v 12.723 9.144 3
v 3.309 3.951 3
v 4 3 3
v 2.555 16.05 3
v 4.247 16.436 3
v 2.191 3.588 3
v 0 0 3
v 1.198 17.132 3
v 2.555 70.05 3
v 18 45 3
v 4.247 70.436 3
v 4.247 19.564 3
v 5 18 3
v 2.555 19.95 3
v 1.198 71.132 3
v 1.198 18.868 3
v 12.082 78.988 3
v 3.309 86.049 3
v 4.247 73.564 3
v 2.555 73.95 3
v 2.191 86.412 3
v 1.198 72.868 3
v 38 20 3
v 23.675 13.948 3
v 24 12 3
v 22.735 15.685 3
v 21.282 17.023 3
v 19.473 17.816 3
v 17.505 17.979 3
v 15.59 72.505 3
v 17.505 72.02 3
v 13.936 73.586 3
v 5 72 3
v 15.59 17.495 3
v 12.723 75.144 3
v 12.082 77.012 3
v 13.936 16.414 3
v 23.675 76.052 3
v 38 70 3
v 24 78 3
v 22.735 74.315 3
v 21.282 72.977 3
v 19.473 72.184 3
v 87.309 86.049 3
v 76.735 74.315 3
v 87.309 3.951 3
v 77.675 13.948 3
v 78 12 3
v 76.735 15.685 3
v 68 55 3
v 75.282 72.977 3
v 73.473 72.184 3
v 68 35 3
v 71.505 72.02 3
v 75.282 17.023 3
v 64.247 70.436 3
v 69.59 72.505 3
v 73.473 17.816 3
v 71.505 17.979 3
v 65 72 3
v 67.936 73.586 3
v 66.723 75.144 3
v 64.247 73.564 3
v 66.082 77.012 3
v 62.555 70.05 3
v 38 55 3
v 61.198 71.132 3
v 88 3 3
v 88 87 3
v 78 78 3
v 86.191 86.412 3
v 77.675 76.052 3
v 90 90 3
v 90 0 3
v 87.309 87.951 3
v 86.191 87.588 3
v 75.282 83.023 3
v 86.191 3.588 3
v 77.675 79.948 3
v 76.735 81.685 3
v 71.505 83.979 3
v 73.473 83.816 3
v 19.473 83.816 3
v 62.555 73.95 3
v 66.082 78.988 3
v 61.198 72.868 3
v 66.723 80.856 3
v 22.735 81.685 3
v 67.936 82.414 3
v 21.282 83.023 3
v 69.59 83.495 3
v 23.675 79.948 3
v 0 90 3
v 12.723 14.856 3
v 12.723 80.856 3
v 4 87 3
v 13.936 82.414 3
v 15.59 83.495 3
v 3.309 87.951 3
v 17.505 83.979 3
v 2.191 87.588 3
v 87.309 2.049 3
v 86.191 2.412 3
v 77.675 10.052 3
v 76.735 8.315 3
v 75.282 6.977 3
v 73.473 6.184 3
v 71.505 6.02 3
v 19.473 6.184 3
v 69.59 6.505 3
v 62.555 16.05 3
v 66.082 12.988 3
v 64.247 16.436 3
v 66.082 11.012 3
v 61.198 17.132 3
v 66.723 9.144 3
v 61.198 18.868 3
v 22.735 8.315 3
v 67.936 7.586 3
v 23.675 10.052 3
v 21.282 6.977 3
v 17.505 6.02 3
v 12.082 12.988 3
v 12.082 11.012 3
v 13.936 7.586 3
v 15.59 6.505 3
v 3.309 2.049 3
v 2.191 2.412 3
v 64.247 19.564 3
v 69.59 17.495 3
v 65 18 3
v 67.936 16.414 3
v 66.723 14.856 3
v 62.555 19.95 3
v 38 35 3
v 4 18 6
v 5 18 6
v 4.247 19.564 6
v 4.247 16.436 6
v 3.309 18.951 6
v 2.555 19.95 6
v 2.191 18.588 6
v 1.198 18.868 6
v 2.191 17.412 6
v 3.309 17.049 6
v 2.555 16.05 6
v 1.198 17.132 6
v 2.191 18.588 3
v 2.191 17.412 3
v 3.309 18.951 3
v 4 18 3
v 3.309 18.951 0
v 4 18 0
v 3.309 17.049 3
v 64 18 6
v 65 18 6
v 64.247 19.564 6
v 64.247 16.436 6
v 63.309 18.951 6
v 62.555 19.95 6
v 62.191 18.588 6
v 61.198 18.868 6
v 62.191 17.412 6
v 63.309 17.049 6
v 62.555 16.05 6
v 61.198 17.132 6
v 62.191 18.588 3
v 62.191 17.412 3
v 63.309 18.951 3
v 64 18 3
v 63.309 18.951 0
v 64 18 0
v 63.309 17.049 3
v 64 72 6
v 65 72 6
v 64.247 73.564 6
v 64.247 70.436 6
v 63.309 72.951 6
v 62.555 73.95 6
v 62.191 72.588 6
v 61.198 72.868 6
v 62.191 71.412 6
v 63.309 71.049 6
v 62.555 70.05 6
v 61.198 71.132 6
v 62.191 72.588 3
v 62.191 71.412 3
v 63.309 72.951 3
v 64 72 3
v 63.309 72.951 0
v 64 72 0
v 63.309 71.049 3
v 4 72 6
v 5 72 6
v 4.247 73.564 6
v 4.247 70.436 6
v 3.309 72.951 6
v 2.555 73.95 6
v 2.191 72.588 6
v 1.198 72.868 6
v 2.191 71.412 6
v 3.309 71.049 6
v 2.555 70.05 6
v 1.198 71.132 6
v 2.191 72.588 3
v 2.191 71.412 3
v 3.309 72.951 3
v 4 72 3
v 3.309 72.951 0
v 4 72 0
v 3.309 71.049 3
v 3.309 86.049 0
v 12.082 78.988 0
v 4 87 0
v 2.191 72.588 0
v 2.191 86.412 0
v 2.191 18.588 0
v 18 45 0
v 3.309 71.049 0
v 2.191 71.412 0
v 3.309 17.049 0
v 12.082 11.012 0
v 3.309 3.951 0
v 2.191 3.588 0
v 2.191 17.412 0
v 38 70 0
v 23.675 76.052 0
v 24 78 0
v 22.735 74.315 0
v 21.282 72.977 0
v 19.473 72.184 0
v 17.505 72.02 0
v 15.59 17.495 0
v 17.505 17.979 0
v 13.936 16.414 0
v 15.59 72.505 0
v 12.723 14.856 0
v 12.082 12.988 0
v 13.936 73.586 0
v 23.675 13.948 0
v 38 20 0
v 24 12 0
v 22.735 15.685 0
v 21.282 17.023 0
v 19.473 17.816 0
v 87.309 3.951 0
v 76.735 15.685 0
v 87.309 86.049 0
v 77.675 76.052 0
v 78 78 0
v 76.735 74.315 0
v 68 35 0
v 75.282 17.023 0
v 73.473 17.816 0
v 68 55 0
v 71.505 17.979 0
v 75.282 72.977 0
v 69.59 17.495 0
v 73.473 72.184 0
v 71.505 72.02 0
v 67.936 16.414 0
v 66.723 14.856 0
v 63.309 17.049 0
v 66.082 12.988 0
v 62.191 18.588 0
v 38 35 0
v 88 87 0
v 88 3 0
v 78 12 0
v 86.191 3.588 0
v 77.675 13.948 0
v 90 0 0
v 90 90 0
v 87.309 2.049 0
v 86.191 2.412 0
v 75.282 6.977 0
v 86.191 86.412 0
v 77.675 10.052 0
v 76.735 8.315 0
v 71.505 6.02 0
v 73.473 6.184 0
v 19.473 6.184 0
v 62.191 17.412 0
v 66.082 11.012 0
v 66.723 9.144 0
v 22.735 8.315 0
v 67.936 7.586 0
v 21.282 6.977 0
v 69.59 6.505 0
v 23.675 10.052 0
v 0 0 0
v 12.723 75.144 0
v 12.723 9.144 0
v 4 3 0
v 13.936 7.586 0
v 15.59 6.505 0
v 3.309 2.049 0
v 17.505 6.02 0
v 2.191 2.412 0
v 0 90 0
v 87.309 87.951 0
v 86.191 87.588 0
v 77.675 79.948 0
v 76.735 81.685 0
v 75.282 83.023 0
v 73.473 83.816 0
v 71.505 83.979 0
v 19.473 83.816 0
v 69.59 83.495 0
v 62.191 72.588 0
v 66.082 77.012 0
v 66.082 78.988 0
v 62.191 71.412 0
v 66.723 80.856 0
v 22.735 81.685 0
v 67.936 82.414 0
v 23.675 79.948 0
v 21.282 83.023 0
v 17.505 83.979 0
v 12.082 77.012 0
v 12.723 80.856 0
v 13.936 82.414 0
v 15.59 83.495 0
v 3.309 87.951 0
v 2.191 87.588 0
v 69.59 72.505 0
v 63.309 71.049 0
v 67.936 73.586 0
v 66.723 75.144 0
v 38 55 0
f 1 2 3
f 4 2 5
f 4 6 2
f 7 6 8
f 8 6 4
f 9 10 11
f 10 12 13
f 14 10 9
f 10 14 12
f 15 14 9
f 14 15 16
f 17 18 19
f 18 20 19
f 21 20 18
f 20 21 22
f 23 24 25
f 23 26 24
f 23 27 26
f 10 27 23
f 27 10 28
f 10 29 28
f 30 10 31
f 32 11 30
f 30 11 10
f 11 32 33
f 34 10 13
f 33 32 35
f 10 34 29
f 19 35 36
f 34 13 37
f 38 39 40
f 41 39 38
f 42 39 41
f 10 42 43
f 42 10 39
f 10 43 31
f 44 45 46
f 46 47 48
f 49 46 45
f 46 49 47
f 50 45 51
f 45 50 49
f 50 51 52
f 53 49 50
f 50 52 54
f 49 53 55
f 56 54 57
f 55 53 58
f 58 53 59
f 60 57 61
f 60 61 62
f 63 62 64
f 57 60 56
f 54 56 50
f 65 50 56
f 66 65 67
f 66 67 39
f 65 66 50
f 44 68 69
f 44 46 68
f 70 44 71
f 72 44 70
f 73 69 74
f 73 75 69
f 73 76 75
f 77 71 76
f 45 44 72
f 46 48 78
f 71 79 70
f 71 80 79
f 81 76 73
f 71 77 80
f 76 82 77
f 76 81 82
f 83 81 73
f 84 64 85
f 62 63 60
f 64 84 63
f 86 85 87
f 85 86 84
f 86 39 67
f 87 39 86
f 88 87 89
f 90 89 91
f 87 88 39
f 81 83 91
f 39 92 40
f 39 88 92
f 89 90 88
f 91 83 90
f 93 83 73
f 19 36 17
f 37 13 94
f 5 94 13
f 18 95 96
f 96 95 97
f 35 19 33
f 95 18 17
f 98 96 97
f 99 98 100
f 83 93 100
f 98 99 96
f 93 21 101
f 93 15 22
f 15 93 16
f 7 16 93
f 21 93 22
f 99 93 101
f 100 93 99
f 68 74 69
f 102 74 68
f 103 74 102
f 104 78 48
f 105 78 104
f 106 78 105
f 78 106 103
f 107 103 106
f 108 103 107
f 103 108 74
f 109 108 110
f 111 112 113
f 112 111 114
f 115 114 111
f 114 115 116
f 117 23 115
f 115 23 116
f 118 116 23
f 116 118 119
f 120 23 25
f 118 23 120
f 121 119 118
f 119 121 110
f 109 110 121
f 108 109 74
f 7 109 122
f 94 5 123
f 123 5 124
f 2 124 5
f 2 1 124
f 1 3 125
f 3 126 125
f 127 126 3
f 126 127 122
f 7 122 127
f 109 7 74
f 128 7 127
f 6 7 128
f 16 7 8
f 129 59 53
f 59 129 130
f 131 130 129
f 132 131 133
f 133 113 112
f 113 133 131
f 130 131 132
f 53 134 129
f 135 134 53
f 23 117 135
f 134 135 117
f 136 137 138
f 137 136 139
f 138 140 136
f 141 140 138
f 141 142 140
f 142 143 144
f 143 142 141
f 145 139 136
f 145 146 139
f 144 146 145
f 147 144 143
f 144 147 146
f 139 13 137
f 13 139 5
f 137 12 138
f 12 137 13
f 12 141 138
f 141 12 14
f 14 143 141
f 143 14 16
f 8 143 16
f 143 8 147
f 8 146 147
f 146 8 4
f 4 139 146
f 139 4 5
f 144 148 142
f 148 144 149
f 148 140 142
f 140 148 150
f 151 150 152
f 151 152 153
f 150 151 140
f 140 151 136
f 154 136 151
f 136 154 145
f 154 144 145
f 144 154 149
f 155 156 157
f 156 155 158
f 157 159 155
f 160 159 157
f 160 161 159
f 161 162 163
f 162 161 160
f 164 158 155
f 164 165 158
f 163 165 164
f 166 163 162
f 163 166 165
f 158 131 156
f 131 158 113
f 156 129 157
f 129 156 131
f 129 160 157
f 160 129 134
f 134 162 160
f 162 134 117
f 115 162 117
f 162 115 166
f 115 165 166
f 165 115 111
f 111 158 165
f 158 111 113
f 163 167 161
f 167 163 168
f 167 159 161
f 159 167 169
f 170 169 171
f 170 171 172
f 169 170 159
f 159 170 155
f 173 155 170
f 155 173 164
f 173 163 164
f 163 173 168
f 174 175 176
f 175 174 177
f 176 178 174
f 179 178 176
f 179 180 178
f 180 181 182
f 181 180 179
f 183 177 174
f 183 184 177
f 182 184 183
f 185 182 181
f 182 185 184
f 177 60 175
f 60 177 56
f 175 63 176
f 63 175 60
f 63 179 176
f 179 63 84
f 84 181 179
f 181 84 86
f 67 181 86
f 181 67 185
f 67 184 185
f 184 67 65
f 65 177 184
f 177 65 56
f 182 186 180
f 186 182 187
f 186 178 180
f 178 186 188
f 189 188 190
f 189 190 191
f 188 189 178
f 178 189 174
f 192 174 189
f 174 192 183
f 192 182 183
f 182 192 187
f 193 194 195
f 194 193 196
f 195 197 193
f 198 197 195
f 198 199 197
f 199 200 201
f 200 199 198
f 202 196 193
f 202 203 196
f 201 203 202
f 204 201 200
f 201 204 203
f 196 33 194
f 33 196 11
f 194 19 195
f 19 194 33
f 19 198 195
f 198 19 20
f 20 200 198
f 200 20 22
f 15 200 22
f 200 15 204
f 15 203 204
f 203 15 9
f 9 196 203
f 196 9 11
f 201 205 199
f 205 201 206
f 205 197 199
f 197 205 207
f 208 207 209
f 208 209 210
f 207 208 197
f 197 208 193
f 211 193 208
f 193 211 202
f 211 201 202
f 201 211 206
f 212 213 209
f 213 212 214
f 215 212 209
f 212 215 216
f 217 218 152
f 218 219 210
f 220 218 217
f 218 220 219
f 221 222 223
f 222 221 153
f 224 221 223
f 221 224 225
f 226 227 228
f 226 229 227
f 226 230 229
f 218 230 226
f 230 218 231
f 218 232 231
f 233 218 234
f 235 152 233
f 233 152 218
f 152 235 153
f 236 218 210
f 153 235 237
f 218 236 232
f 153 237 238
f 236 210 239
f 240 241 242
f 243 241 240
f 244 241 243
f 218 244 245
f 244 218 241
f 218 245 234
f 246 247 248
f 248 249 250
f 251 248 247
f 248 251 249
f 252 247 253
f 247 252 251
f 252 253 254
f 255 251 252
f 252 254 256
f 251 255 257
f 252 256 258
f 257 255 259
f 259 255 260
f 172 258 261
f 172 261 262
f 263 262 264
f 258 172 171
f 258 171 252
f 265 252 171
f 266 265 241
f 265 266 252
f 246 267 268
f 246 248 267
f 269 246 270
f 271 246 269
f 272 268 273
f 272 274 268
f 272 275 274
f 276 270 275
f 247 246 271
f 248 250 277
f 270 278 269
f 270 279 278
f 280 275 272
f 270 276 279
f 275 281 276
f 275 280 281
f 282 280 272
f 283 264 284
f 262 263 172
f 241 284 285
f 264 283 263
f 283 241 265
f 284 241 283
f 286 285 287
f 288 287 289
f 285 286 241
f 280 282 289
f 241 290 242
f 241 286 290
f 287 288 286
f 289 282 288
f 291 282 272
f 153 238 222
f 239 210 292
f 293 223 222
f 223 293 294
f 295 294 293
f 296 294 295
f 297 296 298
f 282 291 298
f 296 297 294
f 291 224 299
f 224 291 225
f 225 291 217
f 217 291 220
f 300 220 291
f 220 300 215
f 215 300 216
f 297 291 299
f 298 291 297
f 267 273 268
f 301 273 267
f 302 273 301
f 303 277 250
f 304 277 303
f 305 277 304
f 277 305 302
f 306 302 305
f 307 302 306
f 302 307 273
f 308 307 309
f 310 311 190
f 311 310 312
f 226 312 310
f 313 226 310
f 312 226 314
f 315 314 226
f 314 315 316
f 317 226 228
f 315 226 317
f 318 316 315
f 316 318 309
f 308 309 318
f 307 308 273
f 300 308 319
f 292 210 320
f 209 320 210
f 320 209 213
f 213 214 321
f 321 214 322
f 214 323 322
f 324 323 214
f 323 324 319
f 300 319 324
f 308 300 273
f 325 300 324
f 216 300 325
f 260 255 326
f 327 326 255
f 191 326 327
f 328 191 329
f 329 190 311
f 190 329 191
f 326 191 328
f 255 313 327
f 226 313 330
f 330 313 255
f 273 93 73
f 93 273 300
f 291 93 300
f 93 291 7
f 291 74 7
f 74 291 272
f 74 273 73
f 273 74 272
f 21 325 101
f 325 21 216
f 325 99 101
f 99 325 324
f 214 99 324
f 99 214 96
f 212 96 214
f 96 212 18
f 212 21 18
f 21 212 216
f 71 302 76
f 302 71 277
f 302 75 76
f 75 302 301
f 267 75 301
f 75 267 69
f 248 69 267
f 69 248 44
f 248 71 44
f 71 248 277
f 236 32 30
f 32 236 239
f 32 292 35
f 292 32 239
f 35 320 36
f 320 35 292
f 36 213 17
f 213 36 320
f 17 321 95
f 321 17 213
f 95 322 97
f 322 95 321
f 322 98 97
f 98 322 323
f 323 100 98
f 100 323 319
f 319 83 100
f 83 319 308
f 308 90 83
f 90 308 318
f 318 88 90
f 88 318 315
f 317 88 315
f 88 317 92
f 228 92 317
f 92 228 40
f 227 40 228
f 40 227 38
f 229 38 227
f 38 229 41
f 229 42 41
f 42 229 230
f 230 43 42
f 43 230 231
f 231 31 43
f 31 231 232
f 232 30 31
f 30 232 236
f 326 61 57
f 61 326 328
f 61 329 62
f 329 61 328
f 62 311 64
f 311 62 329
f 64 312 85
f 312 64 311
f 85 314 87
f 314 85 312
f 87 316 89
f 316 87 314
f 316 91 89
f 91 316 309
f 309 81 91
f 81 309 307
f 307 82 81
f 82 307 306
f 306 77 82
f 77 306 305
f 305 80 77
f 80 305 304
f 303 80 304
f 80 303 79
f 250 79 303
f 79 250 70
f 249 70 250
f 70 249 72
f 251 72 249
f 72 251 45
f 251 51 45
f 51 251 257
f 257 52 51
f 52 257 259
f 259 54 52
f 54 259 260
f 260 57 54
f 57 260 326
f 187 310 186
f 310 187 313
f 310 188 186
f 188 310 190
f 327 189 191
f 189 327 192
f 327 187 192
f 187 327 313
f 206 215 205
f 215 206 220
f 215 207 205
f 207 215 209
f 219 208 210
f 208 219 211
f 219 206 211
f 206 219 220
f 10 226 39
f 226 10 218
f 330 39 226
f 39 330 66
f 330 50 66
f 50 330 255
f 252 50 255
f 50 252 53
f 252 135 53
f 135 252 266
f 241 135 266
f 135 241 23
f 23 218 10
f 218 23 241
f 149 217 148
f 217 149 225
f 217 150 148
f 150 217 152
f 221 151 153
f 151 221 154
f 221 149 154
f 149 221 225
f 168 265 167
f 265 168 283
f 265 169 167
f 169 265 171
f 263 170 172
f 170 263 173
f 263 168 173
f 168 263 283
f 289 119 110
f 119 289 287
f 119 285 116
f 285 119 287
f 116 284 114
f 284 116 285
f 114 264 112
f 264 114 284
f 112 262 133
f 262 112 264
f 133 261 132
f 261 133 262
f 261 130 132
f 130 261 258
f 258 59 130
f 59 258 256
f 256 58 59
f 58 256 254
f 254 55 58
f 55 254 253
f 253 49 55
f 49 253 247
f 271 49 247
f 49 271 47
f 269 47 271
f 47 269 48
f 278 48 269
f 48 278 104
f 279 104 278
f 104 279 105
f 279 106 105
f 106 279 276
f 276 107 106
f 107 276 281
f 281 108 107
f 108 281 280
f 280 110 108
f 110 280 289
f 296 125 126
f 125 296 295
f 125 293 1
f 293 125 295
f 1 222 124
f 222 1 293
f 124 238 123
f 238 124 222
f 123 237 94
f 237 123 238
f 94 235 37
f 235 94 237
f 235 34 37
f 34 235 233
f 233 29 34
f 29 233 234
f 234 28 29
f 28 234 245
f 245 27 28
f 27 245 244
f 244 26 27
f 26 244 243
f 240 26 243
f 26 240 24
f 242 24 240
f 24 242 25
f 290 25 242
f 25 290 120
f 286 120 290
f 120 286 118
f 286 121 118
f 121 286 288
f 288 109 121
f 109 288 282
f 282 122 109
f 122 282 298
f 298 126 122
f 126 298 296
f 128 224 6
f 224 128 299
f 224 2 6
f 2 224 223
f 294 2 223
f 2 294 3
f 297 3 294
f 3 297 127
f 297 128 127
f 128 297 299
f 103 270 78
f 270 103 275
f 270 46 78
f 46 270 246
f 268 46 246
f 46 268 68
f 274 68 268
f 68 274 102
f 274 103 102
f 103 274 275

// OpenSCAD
use <../../Writescad/Write.scad>

////////////////////////
// HOLES

module screw_hole(x,y)
{
    r = 1;
    translate([x,y,0])
        circle(r);
}

module screw_buffer(x,y,z)
{
    inner_r = 1;
    outer_r = 2;
    height = 3;
    translate([x,y,z])
        linear_extrude(0,0,height)
            difference()
            {
                circle(outer_r);
                circle(inner_r);
            }
}

module all_screw_holes()
{
    //Pi Board holes
    screw_hole(3,18);
    screw_hole(63,18);
    screw_hole(63,72);
    screw_hole(3,72);
    //leg holes
    screw_hole(3,3);
    screw_hole(3,87);
    screw_hole(87,87);
    screw_hole(87,3);
}

module all_screw_buffers(z)
{
    //Pi Board buffers
    screw_buffer(3,18,z);
    screw_buffer(63,18,z);
    screw_buffer(63,72,z);
    screw_buffer(3,72,z);
}

module wire_holes(base_width)
{
    translate([18,base_width-12,0])
        circle(r=6);
    translate([base_width-18,base_width-12,0])
        circle(r=6);
    translate([base_width-18,12,0])
        circle(r=6);
    translate([18,12,0])
        circle(r=6);
}

////////////////////////
// BASE

module arrow()
{
    triangle_shape = [
        [0, 0],
        [20, 25],
        [20, 10],
        [50, 10],
        [50, 0]
    ];
    mirror([0, 90])
        polygon(points=triangle_shape);
    polygon(points=triangle_shape);
}

module base(base_width, base_thickness, arrow_pos)
{
    difference()
    {
        square(base_width);
        translate(arrow_pos)
            arrow(arrow_pos);
    }
}

module text(base_width)
{   
    translate([6, base_width-10, 2])
        write("0");
    translate([base_width-9, base_width-10, 2])
        write("1");
    translate([base_width-9, 6, 2])
        write("2");
    translate([6, 6, 2])
        write("3");
}

////////////////////////
// GLOBALS

base_thickness = 3;
base_width = 90;
arrow_pos = [18,45];

////////////////////////
// RENDERS

all_screw_buffers(base_thickness);
difference()
{
    linear_extrude(0,0,base_thickness)
        difference()
        {
            difference()
            {
                base(base_width, base_thickness, arrow_pos);          wire_holes(base_width);      
            }
            all_screw_holes();
        }
    text(base_width);
}
